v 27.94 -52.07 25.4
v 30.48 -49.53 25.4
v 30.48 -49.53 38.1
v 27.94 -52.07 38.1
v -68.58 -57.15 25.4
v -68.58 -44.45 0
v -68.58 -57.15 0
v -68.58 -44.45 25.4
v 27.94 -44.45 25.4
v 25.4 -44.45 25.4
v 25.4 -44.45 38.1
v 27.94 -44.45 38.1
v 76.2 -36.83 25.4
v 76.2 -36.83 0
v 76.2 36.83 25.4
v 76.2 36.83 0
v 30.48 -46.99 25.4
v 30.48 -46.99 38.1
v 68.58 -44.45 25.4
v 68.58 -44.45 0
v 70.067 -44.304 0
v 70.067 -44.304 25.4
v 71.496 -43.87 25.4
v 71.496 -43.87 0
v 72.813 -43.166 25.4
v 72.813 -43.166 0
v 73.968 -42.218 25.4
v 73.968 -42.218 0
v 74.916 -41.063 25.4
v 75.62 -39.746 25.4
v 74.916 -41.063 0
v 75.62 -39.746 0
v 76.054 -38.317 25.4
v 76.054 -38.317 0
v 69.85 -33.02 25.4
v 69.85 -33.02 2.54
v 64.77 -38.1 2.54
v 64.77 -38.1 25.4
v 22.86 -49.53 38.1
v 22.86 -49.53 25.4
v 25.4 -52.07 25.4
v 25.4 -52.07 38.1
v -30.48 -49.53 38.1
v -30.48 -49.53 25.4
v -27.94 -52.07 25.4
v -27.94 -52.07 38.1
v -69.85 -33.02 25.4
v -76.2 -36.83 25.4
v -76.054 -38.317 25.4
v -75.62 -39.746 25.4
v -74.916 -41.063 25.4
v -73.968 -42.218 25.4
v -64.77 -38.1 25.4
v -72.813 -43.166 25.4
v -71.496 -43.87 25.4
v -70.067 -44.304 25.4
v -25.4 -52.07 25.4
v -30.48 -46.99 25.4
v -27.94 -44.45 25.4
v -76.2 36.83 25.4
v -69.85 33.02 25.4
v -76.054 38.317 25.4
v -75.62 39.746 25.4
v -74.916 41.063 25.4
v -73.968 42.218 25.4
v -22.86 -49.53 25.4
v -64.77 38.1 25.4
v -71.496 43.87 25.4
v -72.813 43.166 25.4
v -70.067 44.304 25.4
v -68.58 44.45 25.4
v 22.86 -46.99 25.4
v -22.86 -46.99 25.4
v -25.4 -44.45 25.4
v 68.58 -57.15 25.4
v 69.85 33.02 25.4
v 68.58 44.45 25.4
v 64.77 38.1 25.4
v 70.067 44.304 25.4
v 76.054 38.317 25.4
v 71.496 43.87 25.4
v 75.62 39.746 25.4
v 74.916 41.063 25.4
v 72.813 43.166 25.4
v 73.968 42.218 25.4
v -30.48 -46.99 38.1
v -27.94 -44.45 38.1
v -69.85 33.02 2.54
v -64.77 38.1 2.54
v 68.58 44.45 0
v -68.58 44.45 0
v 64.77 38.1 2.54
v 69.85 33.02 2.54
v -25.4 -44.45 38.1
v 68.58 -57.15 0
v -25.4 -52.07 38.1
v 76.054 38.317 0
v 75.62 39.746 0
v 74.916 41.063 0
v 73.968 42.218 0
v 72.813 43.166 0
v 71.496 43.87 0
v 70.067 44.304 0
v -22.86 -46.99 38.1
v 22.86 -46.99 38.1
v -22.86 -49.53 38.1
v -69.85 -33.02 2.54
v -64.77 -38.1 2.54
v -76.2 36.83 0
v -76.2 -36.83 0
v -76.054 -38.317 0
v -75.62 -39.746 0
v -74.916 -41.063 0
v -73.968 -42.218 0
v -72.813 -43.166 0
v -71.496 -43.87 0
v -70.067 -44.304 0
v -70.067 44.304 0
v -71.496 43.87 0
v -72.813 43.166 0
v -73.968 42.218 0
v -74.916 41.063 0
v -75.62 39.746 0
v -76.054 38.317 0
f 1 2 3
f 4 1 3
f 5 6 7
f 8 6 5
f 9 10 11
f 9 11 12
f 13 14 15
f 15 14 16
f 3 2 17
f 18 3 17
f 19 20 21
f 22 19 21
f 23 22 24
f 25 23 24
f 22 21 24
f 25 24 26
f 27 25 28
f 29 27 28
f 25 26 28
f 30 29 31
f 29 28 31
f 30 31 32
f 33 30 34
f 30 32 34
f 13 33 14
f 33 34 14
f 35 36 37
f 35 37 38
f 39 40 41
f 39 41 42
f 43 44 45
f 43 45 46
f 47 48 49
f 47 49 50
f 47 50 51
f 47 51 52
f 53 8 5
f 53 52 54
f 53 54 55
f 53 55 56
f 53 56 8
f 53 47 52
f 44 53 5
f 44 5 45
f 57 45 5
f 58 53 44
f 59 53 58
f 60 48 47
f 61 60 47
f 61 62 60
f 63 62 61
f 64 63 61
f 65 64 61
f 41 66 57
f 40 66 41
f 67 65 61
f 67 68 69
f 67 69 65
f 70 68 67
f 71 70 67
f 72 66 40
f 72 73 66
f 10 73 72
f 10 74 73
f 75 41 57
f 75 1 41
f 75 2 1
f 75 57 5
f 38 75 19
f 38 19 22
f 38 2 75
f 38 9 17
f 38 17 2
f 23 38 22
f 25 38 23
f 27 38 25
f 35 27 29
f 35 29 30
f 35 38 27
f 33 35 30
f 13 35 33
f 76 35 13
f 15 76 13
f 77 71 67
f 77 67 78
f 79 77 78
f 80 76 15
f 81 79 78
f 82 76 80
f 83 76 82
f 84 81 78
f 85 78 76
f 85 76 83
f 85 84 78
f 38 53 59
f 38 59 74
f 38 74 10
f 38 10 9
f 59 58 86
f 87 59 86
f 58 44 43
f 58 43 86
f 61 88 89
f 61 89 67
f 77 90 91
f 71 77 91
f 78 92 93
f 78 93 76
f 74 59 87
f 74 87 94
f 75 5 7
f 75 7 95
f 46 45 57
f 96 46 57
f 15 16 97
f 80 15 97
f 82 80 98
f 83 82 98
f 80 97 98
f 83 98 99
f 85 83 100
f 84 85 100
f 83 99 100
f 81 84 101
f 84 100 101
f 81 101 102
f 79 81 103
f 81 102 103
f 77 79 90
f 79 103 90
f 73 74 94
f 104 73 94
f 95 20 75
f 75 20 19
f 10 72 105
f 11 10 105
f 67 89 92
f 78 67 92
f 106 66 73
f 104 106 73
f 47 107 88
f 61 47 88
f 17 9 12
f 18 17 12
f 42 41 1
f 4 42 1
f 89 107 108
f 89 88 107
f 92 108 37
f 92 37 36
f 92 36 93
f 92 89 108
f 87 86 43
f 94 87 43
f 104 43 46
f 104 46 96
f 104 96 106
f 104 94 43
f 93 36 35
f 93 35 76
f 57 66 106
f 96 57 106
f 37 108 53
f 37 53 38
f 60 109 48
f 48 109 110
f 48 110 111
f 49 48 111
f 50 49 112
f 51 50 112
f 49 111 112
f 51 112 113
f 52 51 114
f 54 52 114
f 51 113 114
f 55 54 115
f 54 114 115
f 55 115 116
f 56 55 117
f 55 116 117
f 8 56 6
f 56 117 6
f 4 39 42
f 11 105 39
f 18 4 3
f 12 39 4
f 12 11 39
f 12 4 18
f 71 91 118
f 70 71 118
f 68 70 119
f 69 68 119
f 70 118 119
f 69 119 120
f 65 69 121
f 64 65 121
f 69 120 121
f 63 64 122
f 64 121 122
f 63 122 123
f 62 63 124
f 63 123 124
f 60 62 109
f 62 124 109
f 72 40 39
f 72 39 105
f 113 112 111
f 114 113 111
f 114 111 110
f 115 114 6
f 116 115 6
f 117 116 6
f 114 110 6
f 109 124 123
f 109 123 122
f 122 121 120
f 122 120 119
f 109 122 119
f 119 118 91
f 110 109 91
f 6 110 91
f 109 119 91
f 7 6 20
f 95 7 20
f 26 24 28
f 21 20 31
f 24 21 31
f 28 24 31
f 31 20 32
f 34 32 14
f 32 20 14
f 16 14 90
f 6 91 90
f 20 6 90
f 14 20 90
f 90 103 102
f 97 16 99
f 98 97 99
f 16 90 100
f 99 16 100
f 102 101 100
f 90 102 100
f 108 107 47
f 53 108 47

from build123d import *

# Parameters (mm, degrees)
F0_W      = 139.7
F0_H      = 76.2
F1_DEPTH  = 25.4
F2_SIZE   = 5.08
F3_W      = 144.291125
F3_H      = 81.529271
F4_DEPTH  = 2.54
F1_FACE_W = 137.16
F1_FACE_H = 25.4
F5_DEPTH  = 12.7
F6_W      = 7.62
F6_H      = 7.62
F7_DEPTH  = 12.7
F8_SIZE   = 2.54
F9_SIZE   = 2.54
F10_SIZE  = 2.54
F11_SIZE  = 2.54


with BuildPart() as f1:
    # F0 (on Top) → F1 (new body)
    with BuildSketch(Plane.XY):
        with BuildLine():
            ThreePointArc((76.2, 36.83), (73.968154, 42.218154), (68.58, 44.45))
            Line((68.58, 44.45), (-68.58, 44.45))
            ThreePointArc((-68.58, 44.45), (-73.968154, 42.218154), (-76.2, 36.83))
            Line((-76.2, 36.83), (-76.2, -36.83))
            ThreePointArc((-76.2, -36.83), (-73.968154, -42.218154), (-68.58, -44.45))
            Line((-68.58, -44.45), (68.58, -44.45))
            ThreePointArc((68.58, -44.45), (73.968154, -42.218154), (76.2, -36.83))
            Line((76.2, -36.83), (76.2, 36.83))
        make_face()
        Rectangle(F0_W, F0_H, mode=Mode.SUBTRACT)
    extrude(amount=F1_DEPTH)

    # F2
    f2_edges = [f1.edges().sort_by_distance(p)[0] for p in [
        (-69.85, 38.1, 12.7),
        (-69.85, -38.1, 12.7),
        (69.85, 38.1, 12.7),
        (69.85, -38.1, 12.7),
    ]]
    chamfer(f2_edges, length=F2_SIZE)

    # F3 (on Top) → F4 (join)
    with BuildSketch(Plane.XY):
        with Locations((-0.039962, 0.51033)):
            Rectangle(F3_W, F3_H)
    extrude(amount=F4_DEPTH)

    # F1_face (on face) → F5 (join)
    with BuildSketch(Plane(origin=(0, -44.45, 12.7), x_dir=(1, 0, 0), z_dir=(0, -1, 0))):
        Rectangle(F1_FACE_W, F1_FACE_H)
    extrude(amount=F5_DEPTH)

    # F6 (on face) → F7 (join)
    with BuildSketch(Plane.XY.offset(25.4)):
        with Locations((26.67, -48.26)):
            Rectangle(F6_W, F6_H)
        with Locations((-26.67, -48.26)):
            Rectangle(F6_W, F6_H)
    extrude(amount=F7_DEPTH)

    # F8
    f8_edges = [f1.edges().sort_by_distance(p)[0] for p in [
        (30.48, -44.45, 31.75),
    ]]
    chamfer(f8_edges, length=F8_SIZE)

    # F9
    f9_edges = [f1.edges().sort_by_distance(p)[0] for p in [
        (22.86, -44.45, 31.75),
        (22.86, -52.07, 31.75),
    ]]
    chamfer(f9_edges, length=F9_SIZE)

    # F10
    f10_edges = [f1.edges().sort_by_distance(p)[0] for p in [
        (30.48, -52.07, 31.75),
    ]]
    chamfer(f10_edges, length=F10_SIZE)

    # F11
    f11_edges = [f1.edges().sort_by_distance(p)[0] for p in [
        (-30.48, -44.45, 31.75),
        (-22.86, -44.45, 31.75),
        (-30.48, -52.07, 31.75),
        (-22.86, -52.07, 31.75),
    ]]
    chamfer(f11_edges, length=F11_SIZE)


solid = f1.part
